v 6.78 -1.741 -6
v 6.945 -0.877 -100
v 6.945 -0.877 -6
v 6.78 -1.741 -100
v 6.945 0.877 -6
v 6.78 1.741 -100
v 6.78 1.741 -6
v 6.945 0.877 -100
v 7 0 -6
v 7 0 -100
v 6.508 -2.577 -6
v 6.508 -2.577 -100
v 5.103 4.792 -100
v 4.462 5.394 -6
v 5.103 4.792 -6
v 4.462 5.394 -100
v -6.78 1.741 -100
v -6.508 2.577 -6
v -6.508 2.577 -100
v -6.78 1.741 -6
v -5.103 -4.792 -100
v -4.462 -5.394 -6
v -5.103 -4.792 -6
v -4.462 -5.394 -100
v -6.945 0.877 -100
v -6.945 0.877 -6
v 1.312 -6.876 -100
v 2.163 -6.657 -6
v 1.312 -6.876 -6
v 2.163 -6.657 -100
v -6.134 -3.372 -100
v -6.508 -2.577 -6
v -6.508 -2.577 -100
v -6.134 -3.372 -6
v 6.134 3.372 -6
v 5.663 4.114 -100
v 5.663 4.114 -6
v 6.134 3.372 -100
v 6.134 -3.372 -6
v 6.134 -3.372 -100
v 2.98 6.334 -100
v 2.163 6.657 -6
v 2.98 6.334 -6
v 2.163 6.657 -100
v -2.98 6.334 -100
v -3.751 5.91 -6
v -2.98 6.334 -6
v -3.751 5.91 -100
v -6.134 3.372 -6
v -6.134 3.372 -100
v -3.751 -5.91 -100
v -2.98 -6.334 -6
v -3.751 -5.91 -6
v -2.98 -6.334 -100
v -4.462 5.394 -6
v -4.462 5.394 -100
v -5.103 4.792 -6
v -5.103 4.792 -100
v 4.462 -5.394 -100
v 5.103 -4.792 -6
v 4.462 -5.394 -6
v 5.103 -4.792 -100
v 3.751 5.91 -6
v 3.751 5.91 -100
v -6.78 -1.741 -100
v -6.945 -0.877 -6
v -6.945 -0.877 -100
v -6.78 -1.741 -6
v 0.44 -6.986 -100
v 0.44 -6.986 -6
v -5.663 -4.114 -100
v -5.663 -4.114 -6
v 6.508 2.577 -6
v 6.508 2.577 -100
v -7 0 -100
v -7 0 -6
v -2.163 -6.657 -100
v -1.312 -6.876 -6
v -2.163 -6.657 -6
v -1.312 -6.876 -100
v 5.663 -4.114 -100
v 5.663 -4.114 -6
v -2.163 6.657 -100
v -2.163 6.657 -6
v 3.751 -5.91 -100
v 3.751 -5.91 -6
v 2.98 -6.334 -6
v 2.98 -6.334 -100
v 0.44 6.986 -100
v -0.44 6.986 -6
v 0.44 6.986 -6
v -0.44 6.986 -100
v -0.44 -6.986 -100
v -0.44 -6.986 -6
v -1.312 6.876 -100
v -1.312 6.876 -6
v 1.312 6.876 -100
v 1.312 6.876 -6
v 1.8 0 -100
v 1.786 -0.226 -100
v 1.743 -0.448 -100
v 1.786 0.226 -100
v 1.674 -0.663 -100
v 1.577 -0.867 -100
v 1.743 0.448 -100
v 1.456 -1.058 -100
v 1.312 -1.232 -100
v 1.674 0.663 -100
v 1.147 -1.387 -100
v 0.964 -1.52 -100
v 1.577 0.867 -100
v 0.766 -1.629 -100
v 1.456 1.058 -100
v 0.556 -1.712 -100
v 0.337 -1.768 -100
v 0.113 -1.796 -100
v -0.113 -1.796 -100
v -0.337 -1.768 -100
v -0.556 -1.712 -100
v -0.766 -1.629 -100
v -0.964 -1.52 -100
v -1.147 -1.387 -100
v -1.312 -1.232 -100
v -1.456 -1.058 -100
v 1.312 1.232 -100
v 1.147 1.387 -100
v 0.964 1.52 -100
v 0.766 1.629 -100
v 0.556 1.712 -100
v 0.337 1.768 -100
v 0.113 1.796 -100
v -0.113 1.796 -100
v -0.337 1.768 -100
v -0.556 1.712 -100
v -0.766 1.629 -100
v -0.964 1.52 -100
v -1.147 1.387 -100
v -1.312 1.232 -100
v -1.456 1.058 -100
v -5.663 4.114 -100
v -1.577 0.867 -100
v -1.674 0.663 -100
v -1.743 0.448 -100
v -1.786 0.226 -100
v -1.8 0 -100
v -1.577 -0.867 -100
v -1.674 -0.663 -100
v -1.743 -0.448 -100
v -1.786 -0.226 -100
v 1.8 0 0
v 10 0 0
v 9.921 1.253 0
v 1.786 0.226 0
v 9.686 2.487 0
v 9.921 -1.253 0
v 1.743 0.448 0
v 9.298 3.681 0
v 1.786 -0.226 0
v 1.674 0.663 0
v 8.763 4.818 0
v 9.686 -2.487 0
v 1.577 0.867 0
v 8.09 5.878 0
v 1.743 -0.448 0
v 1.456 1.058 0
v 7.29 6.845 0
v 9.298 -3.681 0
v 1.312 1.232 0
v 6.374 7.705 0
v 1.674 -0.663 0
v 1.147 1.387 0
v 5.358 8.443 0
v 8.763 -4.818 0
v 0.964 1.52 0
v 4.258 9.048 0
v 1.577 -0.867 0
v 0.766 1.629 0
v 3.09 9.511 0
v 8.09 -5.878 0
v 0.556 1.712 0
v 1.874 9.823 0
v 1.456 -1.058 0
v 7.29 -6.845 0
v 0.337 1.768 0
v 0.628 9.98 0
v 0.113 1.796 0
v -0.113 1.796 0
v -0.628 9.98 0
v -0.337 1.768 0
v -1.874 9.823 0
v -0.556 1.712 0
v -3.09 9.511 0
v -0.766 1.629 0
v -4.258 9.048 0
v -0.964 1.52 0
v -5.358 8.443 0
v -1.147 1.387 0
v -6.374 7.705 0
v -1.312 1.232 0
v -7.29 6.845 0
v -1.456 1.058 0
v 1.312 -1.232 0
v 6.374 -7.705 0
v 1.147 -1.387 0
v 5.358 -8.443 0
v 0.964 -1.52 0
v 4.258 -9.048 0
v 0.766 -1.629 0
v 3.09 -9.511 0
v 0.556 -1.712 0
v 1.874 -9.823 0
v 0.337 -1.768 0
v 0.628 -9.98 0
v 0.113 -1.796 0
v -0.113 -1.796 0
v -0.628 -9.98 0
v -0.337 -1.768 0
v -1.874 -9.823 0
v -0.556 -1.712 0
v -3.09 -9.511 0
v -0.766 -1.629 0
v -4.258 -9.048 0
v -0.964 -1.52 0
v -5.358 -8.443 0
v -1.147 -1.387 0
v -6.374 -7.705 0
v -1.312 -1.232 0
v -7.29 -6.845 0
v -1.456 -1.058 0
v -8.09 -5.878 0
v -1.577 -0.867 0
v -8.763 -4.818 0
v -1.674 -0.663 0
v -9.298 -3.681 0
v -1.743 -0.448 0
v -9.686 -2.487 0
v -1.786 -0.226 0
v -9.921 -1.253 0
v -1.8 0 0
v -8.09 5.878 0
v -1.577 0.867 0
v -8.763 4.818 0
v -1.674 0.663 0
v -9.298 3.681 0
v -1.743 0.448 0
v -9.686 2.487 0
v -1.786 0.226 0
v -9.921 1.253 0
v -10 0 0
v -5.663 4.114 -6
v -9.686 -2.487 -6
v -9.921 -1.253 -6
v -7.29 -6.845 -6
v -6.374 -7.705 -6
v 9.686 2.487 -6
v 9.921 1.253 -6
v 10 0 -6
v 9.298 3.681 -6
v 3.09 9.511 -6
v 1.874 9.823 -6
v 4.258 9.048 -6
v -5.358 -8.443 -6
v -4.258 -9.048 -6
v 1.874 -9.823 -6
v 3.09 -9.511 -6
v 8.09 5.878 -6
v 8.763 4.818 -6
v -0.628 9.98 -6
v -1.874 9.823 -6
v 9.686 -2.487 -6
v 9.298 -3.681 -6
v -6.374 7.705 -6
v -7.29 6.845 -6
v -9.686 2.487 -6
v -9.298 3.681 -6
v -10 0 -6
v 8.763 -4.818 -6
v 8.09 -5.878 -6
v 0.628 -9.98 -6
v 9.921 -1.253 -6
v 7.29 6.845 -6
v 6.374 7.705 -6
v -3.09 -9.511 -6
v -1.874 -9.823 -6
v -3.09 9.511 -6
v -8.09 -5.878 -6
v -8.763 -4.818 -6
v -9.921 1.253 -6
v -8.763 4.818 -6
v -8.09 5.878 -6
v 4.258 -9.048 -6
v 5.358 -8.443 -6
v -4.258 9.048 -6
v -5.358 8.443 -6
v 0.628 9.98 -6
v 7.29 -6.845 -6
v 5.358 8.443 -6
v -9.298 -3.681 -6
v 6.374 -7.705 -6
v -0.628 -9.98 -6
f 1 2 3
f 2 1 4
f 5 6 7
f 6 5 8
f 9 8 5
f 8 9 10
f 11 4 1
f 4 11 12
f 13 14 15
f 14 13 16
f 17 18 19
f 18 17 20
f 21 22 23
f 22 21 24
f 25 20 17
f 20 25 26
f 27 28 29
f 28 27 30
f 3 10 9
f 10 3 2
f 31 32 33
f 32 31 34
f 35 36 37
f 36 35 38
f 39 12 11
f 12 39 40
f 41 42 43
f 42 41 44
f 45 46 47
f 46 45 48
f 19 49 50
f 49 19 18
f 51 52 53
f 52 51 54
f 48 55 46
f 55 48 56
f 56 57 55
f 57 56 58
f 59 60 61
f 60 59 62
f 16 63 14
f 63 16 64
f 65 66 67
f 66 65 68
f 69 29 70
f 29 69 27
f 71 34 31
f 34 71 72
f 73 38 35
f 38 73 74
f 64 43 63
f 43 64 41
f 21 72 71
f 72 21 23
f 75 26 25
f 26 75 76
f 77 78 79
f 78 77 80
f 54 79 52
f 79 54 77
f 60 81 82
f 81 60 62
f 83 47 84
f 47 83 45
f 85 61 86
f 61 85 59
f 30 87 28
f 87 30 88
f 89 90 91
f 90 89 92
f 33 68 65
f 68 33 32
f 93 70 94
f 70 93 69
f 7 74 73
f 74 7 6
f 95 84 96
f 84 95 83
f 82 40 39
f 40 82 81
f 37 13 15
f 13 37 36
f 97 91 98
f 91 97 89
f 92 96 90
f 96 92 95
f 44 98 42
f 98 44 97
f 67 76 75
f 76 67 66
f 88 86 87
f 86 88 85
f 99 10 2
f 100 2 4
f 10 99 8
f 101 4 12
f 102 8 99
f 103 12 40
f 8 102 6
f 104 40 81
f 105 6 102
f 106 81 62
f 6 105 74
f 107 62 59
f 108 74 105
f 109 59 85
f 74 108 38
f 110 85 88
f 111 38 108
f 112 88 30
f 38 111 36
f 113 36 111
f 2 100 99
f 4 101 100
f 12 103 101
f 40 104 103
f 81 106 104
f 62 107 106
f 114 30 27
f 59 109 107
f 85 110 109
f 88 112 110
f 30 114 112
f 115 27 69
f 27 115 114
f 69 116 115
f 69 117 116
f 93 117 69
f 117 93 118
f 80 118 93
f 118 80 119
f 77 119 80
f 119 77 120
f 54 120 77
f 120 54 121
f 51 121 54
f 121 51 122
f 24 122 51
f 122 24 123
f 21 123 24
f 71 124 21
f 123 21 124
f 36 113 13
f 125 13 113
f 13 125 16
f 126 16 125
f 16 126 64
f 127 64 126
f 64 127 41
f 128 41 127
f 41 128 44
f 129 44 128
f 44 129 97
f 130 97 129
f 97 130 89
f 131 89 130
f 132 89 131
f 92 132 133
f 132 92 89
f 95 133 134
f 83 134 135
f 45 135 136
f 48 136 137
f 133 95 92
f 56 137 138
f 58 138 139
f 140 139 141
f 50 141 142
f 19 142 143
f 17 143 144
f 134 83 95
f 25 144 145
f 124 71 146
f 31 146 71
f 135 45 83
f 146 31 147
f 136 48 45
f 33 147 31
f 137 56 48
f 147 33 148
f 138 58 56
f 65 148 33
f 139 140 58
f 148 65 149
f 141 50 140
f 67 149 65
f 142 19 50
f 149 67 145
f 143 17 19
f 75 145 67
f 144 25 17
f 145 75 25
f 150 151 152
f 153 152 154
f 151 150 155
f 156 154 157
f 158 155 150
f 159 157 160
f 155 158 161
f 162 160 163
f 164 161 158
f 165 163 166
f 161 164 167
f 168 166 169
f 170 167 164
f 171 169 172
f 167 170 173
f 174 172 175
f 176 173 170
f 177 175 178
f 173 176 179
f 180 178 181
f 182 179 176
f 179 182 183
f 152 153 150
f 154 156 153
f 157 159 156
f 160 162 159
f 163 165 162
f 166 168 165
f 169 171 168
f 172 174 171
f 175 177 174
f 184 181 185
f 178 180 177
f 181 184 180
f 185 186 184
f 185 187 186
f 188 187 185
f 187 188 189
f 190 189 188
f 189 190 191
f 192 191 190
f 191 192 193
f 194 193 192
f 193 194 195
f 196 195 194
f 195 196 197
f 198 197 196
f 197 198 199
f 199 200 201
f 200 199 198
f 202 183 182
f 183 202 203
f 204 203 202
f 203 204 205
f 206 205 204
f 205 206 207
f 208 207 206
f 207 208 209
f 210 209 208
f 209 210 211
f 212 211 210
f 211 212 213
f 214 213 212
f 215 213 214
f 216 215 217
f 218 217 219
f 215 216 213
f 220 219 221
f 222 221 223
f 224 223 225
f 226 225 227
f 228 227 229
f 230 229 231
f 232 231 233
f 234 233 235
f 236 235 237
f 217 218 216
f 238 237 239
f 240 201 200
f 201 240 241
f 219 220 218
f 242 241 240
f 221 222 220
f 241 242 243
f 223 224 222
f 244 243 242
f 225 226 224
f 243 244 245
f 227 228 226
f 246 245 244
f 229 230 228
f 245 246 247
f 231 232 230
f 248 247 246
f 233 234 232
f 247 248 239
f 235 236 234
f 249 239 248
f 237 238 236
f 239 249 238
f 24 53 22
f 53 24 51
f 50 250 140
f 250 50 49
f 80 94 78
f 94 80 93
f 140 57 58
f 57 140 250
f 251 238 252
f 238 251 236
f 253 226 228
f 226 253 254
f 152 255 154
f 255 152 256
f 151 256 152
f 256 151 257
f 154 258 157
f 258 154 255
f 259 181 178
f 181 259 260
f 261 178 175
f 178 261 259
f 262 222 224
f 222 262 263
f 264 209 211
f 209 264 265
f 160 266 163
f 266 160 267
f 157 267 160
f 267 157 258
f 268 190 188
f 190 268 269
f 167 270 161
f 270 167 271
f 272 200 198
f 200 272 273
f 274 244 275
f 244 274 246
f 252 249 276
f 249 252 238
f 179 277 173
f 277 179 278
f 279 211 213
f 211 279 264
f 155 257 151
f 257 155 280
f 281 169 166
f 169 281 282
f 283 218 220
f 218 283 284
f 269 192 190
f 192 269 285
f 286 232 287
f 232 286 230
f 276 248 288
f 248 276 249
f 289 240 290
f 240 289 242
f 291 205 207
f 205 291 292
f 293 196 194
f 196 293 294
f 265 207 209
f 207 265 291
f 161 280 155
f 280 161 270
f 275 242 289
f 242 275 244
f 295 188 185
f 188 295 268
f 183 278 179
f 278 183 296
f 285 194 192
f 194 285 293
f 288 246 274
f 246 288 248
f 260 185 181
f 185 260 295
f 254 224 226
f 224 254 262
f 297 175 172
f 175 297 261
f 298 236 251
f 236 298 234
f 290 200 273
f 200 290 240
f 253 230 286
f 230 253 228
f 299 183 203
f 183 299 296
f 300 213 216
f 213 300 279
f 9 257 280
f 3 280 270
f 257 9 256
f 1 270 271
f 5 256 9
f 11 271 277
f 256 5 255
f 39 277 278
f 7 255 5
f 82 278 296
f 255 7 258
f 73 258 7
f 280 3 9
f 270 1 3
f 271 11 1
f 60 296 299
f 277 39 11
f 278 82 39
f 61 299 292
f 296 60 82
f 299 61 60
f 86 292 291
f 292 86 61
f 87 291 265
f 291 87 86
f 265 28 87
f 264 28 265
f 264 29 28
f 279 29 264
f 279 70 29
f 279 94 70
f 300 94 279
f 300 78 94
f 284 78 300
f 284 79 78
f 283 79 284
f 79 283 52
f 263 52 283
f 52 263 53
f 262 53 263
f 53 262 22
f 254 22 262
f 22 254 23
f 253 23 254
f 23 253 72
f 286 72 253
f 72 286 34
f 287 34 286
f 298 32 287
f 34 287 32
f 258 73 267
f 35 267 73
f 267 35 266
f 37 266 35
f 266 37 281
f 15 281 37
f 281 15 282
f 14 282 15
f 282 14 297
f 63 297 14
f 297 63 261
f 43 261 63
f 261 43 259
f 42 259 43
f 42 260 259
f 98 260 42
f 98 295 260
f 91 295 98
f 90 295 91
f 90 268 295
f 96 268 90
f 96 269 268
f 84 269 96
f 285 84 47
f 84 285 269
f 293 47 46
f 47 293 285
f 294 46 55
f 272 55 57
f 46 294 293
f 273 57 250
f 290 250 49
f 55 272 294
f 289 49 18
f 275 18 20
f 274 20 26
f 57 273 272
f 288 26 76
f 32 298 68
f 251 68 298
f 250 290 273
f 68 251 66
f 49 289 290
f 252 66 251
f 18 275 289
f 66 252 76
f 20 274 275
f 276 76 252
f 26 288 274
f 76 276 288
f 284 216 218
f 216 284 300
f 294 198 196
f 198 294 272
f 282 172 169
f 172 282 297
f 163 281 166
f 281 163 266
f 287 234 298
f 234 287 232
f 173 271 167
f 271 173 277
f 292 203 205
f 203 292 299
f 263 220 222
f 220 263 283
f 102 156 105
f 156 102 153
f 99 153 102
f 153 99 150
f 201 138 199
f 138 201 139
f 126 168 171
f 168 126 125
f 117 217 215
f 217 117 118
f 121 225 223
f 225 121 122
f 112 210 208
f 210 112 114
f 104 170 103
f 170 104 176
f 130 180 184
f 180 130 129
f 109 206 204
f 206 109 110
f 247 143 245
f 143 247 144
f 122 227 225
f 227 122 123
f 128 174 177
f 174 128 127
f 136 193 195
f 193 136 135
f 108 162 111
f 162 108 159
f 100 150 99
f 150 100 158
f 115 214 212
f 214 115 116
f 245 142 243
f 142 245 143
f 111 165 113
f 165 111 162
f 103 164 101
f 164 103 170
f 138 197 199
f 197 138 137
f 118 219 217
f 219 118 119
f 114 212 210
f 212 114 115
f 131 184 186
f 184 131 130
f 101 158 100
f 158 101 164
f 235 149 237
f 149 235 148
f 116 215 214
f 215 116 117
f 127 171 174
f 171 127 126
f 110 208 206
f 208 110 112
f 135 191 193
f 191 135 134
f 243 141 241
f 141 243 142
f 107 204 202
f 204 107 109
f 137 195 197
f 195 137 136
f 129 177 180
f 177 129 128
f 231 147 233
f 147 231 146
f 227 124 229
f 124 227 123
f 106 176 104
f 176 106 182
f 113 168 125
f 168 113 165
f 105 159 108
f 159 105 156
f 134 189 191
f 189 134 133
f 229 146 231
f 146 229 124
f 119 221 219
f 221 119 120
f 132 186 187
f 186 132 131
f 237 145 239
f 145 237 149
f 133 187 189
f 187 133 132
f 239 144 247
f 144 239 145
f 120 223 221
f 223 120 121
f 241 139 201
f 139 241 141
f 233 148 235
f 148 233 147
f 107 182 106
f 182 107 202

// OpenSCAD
$fn = 50;


difference() {
	union() {
		translate(v = [0, 0, -100.0000000000]) {
			cylinder(h = 100, r = 7.0000000000);
		}
		translate(v = [0, 0, -6.0000000000]) {
			cylinder(h = 6, r = 10.0000000000);
		}
	}
	union() {
		#translate(v = [0, 0, -100]) {
			cylinder(h = 100, r = 1.8000000000);
		}
	}
}
